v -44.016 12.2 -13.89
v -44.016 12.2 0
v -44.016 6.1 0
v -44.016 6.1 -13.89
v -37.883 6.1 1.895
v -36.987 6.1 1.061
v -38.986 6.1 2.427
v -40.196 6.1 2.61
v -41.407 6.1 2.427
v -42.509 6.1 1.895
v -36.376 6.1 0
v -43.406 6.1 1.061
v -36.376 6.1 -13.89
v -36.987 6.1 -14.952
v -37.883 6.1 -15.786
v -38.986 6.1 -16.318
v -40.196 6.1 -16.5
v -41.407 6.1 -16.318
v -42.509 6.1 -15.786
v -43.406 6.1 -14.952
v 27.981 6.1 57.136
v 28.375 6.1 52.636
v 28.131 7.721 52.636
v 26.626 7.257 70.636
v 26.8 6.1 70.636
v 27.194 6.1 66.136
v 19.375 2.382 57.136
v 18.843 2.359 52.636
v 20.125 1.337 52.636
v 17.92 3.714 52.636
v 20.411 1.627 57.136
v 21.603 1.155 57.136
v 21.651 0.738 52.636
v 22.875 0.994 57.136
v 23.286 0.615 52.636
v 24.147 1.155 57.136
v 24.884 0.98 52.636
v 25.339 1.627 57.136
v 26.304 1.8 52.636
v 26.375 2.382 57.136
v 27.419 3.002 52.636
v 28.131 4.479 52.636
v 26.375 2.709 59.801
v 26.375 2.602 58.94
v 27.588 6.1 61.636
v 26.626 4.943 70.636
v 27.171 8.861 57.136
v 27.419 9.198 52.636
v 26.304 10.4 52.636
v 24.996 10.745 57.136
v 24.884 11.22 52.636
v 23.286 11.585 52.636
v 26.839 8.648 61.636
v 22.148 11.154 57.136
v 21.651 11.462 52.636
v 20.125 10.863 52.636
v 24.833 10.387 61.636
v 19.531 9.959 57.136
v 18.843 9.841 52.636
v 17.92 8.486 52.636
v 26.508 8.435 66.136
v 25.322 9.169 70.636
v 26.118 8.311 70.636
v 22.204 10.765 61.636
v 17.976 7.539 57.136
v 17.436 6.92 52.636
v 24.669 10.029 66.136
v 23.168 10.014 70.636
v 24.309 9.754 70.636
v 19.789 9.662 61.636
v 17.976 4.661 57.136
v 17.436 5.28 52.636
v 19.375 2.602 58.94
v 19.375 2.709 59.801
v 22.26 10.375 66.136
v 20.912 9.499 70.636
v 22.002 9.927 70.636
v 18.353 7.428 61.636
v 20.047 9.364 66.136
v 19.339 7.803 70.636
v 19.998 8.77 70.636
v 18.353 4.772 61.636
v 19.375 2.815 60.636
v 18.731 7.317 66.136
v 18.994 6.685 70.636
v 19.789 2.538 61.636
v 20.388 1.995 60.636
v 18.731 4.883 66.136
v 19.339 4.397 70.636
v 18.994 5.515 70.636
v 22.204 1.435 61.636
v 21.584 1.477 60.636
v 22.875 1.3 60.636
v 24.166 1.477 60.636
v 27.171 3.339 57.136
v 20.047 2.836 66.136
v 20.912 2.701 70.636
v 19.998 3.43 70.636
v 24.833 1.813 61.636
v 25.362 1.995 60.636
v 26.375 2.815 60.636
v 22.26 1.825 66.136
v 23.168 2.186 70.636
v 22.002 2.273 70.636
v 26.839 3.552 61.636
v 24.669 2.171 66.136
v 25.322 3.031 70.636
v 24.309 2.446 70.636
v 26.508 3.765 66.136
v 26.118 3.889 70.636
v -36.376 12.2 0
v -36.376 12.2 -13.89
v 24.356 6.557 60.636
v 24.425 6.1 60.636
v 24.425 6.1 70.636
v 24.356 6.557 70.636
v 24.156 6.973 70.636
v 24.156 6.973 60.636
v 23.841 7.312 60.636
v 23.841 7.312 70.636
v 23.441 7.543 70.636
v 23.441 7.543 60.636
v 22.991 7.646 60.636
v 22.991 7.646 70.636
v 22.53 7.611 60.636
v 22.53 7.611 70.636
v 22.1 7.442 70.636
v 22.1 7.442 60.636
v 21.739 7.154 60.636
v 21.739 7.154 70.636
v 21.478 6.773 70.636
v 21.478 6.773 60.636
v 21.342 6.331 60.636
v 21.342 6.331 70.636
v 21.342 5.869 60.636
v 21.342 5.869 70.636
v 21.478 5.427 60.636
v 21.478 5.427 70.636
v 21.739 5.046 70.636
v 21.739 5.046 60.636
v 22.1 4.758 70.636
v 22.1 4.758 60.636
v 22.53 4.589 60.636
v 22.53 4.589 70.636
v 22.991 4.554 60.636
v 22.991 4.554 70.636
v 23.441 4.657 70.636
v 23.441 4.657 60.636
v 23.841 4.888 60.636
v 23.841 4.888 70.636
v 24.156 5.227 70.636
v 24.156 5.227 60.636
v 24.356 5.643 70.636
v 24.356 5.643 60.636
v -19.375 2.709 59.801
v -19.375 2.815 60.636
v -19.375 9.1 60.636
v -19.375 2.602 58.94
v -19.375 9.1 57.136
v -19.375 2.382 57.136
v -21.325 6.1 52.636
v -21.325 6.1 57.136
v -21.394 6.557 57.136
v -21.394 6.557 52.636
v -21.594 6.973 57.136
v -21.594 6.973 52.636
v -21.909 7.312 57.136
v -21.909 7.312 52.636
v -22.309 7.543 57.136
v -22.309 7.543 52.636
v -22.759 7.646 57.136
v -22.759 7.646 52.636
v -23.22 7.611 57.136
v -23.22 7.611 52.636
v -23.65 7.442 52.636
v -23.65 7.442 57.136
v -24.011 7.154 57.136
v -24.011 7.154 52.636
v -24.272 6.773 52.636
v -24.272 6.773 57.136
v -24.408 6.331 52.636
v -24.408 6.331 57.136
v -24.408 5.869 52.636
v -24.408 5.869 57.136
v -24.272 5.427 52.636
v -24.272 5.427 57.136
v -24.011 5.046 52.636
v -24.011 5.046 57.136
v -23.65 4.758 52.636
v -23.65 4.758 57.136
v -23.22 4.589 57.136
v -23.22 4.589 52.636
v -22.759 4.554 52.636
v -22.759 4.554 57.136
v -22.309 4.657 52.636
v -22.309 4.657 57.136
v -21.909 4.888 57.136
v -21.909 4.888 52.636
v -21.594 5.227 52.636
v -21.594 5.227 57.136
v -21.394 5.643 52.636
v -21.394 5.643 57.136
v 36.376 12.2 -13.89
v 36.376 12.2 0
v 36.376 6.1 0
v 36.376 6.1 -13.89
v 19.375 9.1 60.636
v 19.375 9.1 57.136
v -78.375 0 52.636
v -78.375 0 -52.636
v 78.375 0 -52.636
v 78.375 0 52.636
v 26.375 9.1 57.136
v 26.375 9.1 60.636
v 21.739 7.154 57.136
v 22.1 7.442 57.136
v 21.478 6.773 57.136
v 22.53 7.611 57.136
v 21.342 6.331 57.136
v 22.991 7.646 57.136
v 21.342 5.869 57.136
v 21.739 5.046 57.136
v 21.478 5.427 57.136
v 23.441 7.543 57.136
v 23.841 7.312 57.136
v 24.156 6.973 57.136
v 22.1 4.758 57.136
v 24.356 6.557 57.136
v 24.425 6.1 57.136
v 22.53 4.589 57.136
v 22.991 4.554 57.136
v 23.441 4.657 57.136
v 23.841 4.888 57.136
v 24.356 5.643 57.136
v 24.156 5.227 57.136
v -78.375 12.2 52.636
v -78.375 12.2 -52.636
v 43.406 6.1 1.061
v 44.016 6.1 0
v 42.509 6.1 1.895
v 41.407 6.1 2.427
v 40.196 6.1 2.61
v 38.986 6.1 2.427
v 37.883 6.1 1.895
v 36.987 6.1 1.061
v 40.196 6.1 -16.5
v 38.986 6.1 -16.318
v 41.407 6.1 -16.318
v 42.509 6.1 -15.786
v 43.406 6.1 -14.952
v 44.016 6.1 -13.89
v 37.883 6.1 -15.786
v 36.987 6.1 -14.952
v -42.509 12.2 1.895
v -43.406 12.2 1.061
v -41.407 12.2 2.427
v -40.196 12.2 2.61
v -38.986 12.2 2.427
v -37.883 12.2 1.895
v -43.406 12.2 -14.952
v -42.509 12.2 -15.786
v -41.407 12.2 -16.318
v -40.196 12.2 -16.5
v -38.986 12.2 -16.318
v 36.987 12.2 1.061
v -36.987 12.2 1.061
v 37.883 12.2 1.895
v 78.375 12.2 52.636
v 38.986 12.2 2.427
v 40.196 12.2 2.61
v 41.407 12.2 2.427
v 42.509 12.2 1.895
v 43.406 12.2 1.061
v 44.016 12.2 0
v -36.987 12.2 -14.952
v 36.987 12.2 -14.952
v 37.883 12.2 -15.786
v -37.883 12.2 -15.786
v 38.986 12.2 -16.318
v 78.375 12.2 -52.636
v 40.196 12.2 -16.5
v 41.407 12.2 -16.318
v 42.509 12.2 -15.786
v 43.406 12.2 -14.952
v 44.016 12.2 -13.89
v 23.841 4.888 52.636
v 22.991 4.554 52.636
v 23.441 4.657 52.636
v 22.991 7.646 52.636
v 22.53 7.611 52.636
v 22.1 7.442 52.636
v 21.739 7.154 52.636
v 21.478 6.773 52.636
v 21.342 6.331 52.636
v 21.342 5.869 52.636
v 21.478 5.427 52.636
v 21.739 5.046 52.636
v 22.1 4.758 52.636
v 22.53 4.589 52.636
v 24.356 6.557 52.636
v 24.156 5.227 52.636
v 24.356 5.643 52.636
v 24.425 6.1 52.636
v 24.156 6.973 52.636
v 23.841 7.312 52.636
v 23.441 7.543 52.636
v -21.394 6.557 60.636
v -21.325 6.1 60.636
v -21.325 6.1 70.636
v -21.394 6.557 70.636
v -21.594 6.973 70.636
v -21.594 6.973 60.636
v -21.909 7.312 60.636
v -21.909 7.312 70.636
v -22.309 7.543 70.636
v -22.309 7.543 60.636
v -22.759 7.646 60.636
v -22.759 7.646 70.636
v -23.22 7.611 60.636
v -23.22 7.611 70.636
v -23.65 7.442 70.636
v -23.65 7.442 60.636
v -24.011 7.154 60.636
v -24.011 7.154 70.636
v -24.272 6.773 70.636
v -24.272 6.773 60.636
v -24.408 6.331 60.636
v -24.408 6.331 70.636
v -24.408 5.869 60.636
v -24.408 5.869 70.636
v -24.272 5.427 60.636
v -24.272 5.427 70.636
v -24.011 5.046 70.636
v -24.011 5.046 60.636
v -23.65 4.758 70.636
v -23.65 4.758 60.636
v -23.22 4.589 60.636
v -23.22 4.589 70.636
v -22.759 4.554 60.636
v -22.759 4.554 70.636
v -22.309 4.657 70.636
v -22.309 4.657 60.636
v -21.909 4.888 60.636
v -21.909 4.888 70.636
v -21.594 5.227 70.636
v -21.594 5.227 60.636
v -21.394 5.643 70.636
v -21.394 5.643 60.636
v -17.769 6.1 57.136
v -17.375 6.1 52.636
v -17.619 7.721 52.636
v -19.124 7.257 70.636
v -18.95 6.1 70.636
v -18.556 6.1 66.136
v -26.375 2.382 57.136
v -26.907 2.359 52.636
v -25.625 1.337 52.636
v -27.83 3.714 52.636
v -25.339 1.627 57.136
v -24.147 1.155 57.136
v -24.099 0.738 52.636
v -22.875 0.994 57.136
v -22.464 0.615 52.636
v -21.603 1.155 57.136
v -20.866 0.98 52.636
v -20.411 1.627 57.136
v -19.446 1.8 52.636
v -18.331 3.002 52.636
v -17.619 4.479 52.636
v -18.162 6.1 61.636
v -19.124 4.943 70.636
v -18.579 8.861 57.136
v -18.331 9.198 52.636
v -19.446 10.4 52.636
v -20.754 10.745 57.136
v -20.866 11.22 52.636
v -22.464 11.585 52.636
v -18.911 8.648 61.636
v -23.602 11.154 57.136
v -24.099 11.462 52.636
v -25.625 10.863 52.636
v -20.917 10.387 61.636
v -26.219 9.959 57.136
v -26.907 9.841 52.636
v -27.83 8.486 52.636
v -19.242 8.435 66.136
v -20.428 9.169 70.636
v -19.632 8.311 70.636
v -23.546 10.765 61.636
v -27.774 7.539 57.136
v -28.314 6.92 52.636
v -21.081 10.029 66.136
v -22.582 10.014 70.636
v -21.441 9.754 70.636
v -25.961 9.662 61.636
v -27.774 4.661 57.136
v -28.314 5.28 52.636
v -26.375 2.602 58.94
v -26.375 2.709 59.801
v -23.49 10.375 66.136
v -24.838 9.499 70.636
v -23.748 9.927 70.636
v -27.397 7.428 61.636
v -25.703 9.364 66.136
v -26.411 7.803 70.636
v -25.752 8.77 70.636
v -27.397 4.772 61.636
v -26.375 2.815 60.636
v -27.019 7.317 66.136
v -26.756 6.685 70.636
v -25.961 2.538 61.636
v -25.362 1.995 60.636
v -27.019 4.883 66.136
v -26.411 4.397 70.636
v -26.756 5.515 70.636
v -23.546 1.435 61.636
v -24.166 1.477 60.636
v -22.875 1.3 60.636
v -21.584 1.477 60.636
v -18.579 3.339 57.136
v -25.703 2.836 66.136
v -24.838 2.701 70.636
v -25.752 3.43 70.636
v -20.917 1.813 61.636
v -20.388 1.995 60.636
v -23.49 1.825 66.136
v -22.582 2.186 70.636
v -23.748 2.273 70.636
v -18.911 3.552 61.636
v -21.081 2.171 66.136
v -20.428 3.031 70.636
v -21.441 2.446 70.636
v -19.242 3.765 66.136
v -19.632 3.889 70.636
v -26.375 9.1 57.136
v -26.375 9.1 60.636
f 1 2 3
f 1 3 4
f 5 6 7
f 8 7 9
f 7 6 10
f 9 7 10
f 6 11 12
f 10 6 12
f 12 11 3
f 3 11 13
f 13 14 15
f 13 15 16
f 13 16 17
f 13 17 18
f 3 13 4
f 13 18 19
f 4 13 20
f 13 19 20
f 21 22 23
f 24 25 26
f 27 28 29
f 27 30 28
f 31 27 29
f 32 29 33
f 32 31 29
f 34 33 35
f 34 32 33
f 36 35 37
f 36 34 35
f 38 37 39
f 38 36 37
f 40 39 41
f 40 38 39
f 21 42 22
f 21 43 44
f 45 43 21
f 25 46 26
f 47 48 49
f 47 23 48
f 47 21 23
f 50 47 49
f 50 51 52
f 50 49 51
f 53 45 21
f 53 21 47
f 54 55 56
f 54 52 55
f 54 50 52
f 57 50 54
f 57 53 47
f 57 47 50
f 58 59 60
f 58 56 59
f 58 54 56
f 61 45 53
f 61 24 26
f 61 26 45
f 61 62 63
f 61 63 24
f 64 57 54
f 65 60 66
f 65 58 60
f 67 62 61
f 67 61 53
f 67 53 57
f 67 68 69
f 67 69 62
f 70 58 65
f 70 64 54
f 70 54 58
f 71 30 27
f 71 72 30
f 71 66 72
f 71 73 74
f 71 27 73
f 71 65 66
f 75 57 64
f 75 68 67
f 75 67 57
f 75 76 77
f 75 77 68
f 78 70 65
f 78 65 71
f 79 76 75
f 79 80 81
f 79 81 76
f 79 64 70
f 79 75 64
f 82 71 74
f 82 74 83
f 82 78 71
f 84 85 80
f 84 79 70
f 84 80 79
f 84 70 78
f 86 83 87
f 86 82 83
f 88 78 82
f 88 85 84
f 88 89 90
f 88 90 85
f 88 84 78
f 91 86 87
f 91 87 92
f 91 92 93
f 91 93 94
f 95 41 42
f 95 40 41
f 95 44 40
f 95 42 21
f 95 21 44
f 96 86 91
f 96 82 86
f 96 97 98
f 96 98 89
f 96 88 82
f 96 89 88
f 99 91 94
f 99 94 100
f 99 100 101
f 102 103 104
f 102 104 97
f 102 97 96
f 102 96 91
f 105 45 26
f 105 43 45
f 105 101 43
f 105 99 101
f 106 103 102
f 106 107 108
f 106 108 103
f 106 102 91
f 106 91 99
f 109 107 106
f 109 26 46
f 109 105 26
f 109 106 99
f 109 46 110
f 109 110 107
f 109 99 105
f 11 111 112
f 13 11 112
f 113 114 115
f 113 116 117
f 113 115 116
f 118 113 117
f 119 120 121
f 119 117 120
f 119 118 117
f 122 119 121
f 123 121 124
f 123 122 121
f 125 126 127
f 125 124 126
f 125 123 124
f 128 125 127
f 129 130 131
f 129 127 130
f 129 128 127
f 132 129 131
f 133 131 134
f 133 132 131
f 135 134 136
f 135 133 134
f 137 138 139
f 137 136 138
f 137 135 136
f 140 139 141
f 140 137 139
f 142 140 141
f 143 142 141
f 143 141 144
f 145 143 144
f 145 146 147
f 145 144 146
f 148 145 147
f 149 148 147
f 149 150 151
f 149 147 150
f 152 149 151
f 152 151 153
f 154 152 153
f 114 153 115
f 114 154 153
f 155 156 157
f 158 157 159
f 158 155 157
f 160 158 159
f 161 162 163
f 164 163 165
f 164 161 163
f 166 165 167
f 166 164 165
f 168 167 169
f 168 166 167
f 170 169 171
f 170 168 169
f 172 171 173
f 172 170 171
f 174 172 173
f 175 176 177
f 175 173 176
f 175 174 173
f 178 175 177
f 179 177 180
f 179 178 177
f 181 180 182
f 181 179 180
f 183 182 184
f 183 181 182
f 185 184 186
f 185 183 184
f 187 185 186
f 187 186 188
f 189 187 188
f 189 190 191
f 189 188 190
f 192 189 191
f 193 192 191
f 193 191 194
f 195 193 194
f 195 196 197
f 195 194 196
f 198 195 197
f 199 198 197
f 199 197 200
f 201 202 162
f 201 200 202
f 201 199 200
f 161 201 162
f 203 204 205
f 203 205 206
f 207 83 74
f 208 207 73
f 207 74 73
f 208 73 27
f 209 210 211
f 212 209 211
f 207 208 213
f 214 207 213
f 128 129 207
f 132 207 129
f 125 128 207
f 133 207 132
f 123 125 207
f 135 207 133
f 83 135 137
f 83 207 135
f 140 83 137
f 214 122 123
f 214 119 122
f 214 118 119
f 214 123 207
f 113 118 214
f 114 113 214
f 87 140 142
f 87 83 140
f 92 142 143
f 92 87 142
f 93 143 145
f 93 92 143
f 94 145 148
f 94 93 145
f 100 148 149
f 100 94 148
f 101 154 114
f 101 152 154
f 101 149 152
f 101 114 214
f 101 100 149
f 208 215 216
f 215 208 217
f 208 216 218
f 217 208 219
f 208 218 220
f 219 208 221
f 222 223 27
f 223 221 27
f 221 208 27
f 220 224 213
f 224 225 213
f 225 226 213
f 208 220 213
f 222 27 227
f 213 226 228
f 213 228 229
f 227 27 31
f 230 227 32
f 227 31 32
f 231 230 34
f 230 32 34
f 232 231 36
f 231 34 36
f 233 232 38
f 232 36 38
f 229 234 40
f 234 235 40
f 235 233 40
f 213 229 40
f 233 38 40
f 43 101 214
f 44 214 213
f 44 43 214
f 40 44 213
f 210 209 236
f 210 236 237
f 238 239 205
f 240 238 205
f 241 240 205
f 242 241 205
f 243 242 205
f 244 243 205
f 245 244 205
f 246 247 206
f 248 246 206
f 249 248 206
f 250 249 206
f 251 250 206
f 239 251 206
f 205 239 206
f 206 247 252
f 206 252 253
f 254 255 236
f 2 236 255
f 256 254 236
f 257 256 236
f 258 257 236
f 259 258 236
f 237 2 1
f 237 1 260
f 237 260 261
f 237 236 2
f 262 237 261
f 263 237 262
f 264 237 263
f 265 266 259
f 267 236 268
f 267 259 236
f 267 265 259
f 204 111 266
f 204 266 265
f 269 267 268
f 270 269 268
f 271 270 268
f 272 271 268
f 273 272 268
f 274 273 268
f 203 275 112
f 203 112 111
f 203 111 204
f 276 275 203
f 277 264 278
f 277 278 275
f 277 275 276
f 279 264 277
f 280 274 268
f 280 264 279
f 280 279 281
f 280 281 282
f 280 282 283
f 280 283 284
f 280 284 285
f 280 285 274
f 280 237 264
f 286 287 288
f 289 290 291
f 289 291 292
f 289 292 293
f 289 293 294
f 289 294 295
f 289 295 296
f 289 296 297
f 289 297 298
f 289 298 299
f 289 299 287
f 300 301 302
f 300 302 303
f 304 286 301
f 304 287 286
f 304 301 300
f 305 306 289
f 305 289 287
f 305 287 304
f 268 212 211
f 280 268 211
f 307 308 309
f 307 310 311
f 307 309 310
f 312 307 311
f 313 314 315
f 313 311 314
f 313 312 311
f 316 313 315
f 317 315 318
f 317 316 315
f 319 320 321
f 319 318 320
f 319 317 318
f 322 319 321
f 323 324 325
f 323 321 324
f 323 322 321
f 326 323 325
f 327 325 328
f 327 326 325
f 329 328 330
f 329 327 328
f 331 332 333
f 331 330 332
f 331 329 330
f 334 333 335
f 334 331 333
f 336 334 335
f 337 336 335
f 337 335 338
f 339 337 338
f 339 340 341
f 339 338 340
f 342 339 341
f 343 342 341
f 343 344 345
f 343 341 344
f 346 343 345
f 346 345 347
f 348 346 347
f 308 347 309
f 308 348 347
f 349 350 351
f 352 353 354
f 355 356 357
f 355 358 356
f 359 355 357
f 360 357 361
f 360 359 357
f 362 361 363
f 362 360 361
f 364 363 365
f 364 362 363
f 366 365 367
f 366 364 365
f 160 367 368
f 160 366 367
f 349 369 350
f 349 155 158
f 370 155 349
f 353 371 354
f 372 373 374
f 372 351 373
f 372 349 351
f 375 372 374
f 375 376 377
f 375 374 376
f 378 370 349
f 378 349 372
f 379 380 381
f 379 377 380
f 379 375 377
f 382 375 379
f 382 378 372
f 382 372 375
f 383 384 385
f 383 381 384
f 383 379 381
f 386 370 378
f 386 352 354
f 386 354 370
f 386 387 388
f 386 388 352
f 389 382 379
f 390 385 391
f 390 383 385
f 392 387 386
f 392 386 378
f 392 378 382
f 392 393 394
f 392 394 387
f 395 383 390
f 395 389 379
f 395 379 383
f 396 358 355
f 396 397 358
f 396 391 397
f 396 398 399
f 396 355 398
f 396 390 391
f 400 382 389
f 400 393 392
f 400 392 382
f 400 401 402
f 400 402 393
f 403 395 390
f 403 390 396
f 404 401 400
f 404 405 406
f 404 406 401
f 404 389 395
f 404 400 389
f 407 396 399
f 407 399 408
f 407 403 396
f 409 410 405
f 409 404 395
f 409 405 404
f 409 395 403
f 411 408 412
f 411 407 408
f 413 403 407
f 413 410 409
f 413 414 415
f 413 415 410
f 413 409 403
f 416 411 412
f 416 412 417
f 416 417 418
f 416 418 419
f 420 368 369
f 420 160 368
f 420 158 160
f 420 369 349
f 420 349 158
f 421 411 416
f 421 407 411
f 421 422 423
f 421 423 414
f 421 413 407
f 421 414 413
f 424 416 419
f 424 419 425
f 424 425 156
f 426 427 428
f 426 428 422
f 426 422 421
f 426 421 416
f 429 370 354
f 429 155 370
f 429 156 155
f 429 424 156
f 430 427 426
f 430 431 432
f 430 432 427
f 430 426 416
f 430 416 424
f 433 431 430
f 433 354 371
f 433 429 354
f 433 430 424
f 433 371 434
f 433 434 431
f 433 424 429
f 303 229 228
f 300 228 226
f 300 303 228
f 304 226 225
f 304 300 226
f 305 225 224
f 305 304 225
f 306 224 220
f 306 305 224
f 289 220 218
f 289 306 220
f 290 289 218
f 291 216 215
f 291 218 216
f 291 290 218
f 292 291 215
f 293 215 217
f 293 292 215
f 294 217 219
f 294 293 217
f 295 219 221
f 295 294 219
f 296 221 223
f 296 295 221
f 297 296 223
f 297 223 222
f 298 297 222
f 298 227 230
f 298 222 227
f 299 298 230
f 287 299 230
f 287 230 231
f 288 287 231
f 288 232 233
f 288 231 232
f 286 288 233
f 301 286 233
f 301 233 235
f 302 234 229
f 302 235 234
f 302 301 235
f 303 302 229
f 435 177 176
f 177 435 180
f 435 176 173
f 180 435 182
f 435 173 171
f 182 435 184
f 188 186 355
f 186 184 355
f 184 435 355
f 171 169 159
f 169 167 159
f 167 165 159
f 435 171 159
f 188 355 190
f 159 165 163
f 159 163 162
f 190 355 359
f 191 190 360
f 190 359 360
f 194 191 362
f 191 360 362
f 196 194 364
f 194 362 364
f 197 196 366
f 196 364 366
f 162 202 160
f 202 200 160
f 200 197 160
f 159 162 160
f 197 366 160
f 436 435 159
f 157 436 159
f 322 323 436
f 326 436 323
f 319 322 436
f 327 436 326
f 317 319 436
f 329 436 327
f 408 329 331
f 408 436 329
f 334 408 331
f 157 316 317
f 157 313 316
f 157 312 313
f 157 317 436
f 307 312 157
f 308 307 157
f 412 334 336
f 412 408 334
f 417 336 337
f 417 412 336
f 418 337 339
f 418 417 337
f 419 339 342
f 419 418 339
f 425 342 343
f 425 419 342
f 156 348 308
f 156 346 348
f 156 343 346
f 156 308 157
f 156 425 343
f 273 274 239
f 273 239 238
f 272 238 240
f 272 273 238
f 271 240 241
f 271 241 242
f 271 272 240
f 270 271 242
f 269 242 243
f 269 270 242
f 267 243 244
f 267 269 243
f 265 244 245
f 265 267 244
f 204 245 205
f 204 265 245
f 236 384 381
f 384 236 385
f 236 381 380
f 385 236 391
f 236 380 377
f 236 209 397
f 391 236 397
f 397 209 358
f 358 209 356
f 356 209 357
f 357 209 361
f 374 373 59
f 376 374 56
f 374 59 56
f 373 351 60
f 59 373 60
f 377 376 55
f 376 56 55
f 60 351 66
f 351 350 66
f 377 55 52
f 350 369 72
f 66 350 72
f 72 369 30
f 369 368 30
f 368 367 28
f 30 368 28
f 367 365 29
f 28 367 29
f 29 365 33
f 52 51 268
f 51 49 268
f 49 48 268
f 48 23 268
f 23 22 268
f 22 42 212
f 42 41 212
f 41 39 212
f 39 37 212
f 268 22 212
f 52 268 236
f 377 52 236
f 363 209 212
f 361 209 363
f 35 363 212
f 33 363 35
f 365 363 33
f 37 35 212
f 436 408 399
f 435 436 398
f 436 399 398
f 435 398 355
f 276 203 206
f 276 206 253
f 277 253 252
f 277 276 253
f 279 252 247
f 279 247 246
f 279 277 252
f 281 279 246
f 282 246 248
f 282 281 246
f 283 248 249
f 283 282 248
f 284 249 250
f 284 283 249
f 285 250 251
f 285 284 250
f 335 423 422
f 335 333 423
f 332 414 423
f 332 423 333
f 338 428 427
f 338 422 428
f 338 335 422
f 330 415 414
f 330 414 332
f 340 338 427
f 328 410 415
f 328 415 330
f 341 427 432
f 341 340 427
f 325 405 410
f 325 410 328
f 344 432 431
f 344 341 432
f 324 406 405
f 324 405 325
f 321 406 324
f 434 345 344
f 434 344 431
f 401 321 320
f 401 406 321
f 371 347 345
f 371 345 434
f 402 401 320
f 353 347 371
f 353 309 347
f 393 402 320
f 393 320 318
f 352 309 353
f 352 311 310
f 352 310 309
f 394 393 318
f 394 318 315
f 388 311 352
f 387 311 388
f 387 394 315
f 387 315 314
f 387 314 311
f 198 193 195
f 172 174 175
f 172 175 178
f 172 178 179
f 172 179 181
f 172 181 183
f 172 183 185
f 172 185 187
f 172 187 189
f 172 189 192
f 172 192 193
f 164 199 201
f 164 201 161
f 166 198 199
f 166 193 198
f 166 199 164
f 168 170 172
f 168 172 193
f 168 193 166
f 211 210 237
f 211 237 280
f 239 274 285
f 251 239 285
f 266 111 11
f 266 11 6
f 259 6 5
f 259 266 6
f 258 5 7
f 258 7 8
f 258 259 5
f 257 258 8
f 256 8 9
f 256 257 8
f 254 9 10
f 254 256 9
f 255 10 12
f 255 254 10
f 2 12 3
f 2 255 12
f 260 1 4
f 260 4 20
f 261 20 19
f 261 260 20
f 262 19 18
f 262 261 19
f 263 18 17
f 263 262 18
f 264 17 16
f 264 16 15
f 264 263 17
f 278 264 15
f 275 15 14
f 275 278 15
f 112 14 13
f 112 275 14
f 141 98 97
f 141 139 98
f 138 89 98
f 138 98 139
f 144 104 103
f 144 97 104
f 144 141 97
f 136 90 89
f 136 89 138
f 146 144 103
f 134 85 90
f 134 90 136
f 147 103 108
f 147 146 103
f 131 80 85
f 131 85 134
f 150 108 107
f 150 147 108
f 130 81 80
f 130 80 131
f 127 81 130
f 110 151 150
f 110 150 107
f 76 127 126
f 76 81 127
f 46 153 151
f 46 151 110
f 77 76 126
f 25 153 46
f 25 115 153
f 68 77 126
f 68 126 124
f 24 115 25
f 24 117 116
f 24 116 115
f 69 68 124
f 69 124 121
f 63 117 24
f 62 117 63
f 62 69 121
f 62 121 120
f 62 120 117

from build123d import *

# Parameters (mm, degrees)
SKETCH_1_W          = 156.75
SKETCH_1_H          = 105.271994628
EXTRUDE_1_DEPTH     = 12.2
SKETCH_2_W          = 7.639581741
SKETCH_2_H          = 13.89014237
CUT_EXTRUDE_1_DEPTH = 6.1
SKETCH_4_R          = 5.5
EXTRUDE_2_DEPTH     = 18
EXTRUDE_2_TAPER     = 5
CUT_EXTRUDE_2_REACH = 20
SKETCH_6_R          = 1.55
SKETCH_7_W          = 7
SKETCH_7_H          = 3.5
CUT_EXTRUDE_3_DEPTH = 9.1


with BuildPart() as part:
    # ｽｹｯﾁ1 → ﾎﾞｽ - 押し出し1 (new body)
    with BuildSketch(Plane(origin=(0, 0, 0), x_dir=(1, 0, 0), z_dir=(0, 1, 0))):
        Rectangle(SKETCH_1_W, SKETCH_1_H)
    extrude(amount=EXTRUDE_1_DEPTH)

    # ｽｹｯﾁ2 → ｶｯﾄ - 押し出し1 (cut)
    with BuildSketch(Plane(origin=(0, 12.2, 0), x_dir=(1, 0, 0), z_dir=(0, 1, 0))):
        with BuildLine():
            ThreePointArc((-44.016, 13.890145056), (-40.196209129, 16.500447871), (-36.376418259, 13.890145056))
            Line((-36.376418259, 13.890145056), (-44.016, 13.890145056))
        make_face()
        with Locations((-40.19620913, 6.945073871)):
            Rectangle(SKETCH_2_W, SKETCH_2_H)
        with BuildLine():
            Line((-44.016, 2.686e-06), (-36.376418259, 2.686e-06))
            ThreePointArc((-36.376418259, 2.686e-06), (-40.196209129, -2.610300128), (-44.016, 2.686e-06))
        make_face()
        with BuildLine():
            Line((44.016, 13.890145056), (36.376418259, 13.890145056))
            ThreePointArc((36.376418259, 13.890145056), (40.196209129, 16.500447871), (44.016, 13.890145056))
        make_face()
        with Locations((40.19620913, 6.945073871)):
            Rectangle(SKETCH_2_W, SKETCH_2_H)
        with BuildLine():
            ThreePointArc((44.016, 2.686e-06), (40.196209129, -2.610300128), (36.376418259, 2.686e-06))
            Line((36.376418259, 2.686e-06), (44.016, 2.686e-06))
        make_face()
    extrude(amount=-CUT_EXTRUDE_1_DEPTH, mode=Mode.SUBTRACT)

    # ｽｹｯﾁ4 → ﾎﾞｽ - 押し出し2 (add)
    with BuildSketch(Plane.XY.offset(52.635997314)):
        with Locations((-22.875, 6.1)):
            Circle(SKETCH_4_R)
        with Locations((22.875, 6.1)):
            Circle(SKETCH_4_R)
    extrude(amount=EXTRUDE_2_DEPTH, taper=EXTRUDE_2_TAPER)

    # ｽｹｯﾁ6 → ｶｯﾄ - 押し出し2 (cut, up to next)
    with BuildSketch(Plane.XY.offset(52.635997314), mode=Mode.PRIVATE) as cut_extrude_2_sk1:
        with Locations((-22.875, 6.1)):
            Circle(SKETCH_6_R)
    cut_extrude_2_tool1 = extrude(cut_extrude_2_sk1.sketch, amount=CUT_EXTRUDE_2_REACH, mode=Mode.PRIVATE) & part.part
    add(cut_extrude_2_tool1.solids().sort_by_distance((-22.875, 6.1, 52.635997))[0], mode=Mode.SUBTRACT)
    # ｽｹｯﾁ6 → ｶｯﾄ - 押し出し2 (cut, up to next)
    with BuildSketch(Plane.XY.offset(52.635997314), mode=Mode.PRIVATE) as cut_extrude_2_sk2:
        with Locations((22.875, 6.1)):
            Circle(SKETCH_6_R)
    cut_extrude_2_tool2 = extrude(cut_extrude_2_sk2.sketch, amount=CUT_EXTRUDE_2_REACH, mode=Mode.PRIVATE) & part.part
    add(cut_extrude_2_tool2.solids().sort_by_distance((22.875, 6.1, 52.635997))[0], mode=Mode.SUBTRACT)

    # ｽｹｯﾁ7 → ｶｯﾄ - 押し出し3 (cut)
    with BuildSketch(Plane(origin=(0, 0, 0), x_dir=(1, 0, 0), z_dir=(0, 1, 0))):
        with Locations((-22.875, -58.885997314)):
            Rectangle(SKETCH_7_W, SKETCH_7_H)
        with Locations((22.875, -58.885997314)):
            Rectangle(SKETCH_7_W, SKETCH_7_H)
    extrude(amount=CUT_EXTRUDE_3_DEPTH, mode=Mode.SUBTRACT)


solid = part.part
